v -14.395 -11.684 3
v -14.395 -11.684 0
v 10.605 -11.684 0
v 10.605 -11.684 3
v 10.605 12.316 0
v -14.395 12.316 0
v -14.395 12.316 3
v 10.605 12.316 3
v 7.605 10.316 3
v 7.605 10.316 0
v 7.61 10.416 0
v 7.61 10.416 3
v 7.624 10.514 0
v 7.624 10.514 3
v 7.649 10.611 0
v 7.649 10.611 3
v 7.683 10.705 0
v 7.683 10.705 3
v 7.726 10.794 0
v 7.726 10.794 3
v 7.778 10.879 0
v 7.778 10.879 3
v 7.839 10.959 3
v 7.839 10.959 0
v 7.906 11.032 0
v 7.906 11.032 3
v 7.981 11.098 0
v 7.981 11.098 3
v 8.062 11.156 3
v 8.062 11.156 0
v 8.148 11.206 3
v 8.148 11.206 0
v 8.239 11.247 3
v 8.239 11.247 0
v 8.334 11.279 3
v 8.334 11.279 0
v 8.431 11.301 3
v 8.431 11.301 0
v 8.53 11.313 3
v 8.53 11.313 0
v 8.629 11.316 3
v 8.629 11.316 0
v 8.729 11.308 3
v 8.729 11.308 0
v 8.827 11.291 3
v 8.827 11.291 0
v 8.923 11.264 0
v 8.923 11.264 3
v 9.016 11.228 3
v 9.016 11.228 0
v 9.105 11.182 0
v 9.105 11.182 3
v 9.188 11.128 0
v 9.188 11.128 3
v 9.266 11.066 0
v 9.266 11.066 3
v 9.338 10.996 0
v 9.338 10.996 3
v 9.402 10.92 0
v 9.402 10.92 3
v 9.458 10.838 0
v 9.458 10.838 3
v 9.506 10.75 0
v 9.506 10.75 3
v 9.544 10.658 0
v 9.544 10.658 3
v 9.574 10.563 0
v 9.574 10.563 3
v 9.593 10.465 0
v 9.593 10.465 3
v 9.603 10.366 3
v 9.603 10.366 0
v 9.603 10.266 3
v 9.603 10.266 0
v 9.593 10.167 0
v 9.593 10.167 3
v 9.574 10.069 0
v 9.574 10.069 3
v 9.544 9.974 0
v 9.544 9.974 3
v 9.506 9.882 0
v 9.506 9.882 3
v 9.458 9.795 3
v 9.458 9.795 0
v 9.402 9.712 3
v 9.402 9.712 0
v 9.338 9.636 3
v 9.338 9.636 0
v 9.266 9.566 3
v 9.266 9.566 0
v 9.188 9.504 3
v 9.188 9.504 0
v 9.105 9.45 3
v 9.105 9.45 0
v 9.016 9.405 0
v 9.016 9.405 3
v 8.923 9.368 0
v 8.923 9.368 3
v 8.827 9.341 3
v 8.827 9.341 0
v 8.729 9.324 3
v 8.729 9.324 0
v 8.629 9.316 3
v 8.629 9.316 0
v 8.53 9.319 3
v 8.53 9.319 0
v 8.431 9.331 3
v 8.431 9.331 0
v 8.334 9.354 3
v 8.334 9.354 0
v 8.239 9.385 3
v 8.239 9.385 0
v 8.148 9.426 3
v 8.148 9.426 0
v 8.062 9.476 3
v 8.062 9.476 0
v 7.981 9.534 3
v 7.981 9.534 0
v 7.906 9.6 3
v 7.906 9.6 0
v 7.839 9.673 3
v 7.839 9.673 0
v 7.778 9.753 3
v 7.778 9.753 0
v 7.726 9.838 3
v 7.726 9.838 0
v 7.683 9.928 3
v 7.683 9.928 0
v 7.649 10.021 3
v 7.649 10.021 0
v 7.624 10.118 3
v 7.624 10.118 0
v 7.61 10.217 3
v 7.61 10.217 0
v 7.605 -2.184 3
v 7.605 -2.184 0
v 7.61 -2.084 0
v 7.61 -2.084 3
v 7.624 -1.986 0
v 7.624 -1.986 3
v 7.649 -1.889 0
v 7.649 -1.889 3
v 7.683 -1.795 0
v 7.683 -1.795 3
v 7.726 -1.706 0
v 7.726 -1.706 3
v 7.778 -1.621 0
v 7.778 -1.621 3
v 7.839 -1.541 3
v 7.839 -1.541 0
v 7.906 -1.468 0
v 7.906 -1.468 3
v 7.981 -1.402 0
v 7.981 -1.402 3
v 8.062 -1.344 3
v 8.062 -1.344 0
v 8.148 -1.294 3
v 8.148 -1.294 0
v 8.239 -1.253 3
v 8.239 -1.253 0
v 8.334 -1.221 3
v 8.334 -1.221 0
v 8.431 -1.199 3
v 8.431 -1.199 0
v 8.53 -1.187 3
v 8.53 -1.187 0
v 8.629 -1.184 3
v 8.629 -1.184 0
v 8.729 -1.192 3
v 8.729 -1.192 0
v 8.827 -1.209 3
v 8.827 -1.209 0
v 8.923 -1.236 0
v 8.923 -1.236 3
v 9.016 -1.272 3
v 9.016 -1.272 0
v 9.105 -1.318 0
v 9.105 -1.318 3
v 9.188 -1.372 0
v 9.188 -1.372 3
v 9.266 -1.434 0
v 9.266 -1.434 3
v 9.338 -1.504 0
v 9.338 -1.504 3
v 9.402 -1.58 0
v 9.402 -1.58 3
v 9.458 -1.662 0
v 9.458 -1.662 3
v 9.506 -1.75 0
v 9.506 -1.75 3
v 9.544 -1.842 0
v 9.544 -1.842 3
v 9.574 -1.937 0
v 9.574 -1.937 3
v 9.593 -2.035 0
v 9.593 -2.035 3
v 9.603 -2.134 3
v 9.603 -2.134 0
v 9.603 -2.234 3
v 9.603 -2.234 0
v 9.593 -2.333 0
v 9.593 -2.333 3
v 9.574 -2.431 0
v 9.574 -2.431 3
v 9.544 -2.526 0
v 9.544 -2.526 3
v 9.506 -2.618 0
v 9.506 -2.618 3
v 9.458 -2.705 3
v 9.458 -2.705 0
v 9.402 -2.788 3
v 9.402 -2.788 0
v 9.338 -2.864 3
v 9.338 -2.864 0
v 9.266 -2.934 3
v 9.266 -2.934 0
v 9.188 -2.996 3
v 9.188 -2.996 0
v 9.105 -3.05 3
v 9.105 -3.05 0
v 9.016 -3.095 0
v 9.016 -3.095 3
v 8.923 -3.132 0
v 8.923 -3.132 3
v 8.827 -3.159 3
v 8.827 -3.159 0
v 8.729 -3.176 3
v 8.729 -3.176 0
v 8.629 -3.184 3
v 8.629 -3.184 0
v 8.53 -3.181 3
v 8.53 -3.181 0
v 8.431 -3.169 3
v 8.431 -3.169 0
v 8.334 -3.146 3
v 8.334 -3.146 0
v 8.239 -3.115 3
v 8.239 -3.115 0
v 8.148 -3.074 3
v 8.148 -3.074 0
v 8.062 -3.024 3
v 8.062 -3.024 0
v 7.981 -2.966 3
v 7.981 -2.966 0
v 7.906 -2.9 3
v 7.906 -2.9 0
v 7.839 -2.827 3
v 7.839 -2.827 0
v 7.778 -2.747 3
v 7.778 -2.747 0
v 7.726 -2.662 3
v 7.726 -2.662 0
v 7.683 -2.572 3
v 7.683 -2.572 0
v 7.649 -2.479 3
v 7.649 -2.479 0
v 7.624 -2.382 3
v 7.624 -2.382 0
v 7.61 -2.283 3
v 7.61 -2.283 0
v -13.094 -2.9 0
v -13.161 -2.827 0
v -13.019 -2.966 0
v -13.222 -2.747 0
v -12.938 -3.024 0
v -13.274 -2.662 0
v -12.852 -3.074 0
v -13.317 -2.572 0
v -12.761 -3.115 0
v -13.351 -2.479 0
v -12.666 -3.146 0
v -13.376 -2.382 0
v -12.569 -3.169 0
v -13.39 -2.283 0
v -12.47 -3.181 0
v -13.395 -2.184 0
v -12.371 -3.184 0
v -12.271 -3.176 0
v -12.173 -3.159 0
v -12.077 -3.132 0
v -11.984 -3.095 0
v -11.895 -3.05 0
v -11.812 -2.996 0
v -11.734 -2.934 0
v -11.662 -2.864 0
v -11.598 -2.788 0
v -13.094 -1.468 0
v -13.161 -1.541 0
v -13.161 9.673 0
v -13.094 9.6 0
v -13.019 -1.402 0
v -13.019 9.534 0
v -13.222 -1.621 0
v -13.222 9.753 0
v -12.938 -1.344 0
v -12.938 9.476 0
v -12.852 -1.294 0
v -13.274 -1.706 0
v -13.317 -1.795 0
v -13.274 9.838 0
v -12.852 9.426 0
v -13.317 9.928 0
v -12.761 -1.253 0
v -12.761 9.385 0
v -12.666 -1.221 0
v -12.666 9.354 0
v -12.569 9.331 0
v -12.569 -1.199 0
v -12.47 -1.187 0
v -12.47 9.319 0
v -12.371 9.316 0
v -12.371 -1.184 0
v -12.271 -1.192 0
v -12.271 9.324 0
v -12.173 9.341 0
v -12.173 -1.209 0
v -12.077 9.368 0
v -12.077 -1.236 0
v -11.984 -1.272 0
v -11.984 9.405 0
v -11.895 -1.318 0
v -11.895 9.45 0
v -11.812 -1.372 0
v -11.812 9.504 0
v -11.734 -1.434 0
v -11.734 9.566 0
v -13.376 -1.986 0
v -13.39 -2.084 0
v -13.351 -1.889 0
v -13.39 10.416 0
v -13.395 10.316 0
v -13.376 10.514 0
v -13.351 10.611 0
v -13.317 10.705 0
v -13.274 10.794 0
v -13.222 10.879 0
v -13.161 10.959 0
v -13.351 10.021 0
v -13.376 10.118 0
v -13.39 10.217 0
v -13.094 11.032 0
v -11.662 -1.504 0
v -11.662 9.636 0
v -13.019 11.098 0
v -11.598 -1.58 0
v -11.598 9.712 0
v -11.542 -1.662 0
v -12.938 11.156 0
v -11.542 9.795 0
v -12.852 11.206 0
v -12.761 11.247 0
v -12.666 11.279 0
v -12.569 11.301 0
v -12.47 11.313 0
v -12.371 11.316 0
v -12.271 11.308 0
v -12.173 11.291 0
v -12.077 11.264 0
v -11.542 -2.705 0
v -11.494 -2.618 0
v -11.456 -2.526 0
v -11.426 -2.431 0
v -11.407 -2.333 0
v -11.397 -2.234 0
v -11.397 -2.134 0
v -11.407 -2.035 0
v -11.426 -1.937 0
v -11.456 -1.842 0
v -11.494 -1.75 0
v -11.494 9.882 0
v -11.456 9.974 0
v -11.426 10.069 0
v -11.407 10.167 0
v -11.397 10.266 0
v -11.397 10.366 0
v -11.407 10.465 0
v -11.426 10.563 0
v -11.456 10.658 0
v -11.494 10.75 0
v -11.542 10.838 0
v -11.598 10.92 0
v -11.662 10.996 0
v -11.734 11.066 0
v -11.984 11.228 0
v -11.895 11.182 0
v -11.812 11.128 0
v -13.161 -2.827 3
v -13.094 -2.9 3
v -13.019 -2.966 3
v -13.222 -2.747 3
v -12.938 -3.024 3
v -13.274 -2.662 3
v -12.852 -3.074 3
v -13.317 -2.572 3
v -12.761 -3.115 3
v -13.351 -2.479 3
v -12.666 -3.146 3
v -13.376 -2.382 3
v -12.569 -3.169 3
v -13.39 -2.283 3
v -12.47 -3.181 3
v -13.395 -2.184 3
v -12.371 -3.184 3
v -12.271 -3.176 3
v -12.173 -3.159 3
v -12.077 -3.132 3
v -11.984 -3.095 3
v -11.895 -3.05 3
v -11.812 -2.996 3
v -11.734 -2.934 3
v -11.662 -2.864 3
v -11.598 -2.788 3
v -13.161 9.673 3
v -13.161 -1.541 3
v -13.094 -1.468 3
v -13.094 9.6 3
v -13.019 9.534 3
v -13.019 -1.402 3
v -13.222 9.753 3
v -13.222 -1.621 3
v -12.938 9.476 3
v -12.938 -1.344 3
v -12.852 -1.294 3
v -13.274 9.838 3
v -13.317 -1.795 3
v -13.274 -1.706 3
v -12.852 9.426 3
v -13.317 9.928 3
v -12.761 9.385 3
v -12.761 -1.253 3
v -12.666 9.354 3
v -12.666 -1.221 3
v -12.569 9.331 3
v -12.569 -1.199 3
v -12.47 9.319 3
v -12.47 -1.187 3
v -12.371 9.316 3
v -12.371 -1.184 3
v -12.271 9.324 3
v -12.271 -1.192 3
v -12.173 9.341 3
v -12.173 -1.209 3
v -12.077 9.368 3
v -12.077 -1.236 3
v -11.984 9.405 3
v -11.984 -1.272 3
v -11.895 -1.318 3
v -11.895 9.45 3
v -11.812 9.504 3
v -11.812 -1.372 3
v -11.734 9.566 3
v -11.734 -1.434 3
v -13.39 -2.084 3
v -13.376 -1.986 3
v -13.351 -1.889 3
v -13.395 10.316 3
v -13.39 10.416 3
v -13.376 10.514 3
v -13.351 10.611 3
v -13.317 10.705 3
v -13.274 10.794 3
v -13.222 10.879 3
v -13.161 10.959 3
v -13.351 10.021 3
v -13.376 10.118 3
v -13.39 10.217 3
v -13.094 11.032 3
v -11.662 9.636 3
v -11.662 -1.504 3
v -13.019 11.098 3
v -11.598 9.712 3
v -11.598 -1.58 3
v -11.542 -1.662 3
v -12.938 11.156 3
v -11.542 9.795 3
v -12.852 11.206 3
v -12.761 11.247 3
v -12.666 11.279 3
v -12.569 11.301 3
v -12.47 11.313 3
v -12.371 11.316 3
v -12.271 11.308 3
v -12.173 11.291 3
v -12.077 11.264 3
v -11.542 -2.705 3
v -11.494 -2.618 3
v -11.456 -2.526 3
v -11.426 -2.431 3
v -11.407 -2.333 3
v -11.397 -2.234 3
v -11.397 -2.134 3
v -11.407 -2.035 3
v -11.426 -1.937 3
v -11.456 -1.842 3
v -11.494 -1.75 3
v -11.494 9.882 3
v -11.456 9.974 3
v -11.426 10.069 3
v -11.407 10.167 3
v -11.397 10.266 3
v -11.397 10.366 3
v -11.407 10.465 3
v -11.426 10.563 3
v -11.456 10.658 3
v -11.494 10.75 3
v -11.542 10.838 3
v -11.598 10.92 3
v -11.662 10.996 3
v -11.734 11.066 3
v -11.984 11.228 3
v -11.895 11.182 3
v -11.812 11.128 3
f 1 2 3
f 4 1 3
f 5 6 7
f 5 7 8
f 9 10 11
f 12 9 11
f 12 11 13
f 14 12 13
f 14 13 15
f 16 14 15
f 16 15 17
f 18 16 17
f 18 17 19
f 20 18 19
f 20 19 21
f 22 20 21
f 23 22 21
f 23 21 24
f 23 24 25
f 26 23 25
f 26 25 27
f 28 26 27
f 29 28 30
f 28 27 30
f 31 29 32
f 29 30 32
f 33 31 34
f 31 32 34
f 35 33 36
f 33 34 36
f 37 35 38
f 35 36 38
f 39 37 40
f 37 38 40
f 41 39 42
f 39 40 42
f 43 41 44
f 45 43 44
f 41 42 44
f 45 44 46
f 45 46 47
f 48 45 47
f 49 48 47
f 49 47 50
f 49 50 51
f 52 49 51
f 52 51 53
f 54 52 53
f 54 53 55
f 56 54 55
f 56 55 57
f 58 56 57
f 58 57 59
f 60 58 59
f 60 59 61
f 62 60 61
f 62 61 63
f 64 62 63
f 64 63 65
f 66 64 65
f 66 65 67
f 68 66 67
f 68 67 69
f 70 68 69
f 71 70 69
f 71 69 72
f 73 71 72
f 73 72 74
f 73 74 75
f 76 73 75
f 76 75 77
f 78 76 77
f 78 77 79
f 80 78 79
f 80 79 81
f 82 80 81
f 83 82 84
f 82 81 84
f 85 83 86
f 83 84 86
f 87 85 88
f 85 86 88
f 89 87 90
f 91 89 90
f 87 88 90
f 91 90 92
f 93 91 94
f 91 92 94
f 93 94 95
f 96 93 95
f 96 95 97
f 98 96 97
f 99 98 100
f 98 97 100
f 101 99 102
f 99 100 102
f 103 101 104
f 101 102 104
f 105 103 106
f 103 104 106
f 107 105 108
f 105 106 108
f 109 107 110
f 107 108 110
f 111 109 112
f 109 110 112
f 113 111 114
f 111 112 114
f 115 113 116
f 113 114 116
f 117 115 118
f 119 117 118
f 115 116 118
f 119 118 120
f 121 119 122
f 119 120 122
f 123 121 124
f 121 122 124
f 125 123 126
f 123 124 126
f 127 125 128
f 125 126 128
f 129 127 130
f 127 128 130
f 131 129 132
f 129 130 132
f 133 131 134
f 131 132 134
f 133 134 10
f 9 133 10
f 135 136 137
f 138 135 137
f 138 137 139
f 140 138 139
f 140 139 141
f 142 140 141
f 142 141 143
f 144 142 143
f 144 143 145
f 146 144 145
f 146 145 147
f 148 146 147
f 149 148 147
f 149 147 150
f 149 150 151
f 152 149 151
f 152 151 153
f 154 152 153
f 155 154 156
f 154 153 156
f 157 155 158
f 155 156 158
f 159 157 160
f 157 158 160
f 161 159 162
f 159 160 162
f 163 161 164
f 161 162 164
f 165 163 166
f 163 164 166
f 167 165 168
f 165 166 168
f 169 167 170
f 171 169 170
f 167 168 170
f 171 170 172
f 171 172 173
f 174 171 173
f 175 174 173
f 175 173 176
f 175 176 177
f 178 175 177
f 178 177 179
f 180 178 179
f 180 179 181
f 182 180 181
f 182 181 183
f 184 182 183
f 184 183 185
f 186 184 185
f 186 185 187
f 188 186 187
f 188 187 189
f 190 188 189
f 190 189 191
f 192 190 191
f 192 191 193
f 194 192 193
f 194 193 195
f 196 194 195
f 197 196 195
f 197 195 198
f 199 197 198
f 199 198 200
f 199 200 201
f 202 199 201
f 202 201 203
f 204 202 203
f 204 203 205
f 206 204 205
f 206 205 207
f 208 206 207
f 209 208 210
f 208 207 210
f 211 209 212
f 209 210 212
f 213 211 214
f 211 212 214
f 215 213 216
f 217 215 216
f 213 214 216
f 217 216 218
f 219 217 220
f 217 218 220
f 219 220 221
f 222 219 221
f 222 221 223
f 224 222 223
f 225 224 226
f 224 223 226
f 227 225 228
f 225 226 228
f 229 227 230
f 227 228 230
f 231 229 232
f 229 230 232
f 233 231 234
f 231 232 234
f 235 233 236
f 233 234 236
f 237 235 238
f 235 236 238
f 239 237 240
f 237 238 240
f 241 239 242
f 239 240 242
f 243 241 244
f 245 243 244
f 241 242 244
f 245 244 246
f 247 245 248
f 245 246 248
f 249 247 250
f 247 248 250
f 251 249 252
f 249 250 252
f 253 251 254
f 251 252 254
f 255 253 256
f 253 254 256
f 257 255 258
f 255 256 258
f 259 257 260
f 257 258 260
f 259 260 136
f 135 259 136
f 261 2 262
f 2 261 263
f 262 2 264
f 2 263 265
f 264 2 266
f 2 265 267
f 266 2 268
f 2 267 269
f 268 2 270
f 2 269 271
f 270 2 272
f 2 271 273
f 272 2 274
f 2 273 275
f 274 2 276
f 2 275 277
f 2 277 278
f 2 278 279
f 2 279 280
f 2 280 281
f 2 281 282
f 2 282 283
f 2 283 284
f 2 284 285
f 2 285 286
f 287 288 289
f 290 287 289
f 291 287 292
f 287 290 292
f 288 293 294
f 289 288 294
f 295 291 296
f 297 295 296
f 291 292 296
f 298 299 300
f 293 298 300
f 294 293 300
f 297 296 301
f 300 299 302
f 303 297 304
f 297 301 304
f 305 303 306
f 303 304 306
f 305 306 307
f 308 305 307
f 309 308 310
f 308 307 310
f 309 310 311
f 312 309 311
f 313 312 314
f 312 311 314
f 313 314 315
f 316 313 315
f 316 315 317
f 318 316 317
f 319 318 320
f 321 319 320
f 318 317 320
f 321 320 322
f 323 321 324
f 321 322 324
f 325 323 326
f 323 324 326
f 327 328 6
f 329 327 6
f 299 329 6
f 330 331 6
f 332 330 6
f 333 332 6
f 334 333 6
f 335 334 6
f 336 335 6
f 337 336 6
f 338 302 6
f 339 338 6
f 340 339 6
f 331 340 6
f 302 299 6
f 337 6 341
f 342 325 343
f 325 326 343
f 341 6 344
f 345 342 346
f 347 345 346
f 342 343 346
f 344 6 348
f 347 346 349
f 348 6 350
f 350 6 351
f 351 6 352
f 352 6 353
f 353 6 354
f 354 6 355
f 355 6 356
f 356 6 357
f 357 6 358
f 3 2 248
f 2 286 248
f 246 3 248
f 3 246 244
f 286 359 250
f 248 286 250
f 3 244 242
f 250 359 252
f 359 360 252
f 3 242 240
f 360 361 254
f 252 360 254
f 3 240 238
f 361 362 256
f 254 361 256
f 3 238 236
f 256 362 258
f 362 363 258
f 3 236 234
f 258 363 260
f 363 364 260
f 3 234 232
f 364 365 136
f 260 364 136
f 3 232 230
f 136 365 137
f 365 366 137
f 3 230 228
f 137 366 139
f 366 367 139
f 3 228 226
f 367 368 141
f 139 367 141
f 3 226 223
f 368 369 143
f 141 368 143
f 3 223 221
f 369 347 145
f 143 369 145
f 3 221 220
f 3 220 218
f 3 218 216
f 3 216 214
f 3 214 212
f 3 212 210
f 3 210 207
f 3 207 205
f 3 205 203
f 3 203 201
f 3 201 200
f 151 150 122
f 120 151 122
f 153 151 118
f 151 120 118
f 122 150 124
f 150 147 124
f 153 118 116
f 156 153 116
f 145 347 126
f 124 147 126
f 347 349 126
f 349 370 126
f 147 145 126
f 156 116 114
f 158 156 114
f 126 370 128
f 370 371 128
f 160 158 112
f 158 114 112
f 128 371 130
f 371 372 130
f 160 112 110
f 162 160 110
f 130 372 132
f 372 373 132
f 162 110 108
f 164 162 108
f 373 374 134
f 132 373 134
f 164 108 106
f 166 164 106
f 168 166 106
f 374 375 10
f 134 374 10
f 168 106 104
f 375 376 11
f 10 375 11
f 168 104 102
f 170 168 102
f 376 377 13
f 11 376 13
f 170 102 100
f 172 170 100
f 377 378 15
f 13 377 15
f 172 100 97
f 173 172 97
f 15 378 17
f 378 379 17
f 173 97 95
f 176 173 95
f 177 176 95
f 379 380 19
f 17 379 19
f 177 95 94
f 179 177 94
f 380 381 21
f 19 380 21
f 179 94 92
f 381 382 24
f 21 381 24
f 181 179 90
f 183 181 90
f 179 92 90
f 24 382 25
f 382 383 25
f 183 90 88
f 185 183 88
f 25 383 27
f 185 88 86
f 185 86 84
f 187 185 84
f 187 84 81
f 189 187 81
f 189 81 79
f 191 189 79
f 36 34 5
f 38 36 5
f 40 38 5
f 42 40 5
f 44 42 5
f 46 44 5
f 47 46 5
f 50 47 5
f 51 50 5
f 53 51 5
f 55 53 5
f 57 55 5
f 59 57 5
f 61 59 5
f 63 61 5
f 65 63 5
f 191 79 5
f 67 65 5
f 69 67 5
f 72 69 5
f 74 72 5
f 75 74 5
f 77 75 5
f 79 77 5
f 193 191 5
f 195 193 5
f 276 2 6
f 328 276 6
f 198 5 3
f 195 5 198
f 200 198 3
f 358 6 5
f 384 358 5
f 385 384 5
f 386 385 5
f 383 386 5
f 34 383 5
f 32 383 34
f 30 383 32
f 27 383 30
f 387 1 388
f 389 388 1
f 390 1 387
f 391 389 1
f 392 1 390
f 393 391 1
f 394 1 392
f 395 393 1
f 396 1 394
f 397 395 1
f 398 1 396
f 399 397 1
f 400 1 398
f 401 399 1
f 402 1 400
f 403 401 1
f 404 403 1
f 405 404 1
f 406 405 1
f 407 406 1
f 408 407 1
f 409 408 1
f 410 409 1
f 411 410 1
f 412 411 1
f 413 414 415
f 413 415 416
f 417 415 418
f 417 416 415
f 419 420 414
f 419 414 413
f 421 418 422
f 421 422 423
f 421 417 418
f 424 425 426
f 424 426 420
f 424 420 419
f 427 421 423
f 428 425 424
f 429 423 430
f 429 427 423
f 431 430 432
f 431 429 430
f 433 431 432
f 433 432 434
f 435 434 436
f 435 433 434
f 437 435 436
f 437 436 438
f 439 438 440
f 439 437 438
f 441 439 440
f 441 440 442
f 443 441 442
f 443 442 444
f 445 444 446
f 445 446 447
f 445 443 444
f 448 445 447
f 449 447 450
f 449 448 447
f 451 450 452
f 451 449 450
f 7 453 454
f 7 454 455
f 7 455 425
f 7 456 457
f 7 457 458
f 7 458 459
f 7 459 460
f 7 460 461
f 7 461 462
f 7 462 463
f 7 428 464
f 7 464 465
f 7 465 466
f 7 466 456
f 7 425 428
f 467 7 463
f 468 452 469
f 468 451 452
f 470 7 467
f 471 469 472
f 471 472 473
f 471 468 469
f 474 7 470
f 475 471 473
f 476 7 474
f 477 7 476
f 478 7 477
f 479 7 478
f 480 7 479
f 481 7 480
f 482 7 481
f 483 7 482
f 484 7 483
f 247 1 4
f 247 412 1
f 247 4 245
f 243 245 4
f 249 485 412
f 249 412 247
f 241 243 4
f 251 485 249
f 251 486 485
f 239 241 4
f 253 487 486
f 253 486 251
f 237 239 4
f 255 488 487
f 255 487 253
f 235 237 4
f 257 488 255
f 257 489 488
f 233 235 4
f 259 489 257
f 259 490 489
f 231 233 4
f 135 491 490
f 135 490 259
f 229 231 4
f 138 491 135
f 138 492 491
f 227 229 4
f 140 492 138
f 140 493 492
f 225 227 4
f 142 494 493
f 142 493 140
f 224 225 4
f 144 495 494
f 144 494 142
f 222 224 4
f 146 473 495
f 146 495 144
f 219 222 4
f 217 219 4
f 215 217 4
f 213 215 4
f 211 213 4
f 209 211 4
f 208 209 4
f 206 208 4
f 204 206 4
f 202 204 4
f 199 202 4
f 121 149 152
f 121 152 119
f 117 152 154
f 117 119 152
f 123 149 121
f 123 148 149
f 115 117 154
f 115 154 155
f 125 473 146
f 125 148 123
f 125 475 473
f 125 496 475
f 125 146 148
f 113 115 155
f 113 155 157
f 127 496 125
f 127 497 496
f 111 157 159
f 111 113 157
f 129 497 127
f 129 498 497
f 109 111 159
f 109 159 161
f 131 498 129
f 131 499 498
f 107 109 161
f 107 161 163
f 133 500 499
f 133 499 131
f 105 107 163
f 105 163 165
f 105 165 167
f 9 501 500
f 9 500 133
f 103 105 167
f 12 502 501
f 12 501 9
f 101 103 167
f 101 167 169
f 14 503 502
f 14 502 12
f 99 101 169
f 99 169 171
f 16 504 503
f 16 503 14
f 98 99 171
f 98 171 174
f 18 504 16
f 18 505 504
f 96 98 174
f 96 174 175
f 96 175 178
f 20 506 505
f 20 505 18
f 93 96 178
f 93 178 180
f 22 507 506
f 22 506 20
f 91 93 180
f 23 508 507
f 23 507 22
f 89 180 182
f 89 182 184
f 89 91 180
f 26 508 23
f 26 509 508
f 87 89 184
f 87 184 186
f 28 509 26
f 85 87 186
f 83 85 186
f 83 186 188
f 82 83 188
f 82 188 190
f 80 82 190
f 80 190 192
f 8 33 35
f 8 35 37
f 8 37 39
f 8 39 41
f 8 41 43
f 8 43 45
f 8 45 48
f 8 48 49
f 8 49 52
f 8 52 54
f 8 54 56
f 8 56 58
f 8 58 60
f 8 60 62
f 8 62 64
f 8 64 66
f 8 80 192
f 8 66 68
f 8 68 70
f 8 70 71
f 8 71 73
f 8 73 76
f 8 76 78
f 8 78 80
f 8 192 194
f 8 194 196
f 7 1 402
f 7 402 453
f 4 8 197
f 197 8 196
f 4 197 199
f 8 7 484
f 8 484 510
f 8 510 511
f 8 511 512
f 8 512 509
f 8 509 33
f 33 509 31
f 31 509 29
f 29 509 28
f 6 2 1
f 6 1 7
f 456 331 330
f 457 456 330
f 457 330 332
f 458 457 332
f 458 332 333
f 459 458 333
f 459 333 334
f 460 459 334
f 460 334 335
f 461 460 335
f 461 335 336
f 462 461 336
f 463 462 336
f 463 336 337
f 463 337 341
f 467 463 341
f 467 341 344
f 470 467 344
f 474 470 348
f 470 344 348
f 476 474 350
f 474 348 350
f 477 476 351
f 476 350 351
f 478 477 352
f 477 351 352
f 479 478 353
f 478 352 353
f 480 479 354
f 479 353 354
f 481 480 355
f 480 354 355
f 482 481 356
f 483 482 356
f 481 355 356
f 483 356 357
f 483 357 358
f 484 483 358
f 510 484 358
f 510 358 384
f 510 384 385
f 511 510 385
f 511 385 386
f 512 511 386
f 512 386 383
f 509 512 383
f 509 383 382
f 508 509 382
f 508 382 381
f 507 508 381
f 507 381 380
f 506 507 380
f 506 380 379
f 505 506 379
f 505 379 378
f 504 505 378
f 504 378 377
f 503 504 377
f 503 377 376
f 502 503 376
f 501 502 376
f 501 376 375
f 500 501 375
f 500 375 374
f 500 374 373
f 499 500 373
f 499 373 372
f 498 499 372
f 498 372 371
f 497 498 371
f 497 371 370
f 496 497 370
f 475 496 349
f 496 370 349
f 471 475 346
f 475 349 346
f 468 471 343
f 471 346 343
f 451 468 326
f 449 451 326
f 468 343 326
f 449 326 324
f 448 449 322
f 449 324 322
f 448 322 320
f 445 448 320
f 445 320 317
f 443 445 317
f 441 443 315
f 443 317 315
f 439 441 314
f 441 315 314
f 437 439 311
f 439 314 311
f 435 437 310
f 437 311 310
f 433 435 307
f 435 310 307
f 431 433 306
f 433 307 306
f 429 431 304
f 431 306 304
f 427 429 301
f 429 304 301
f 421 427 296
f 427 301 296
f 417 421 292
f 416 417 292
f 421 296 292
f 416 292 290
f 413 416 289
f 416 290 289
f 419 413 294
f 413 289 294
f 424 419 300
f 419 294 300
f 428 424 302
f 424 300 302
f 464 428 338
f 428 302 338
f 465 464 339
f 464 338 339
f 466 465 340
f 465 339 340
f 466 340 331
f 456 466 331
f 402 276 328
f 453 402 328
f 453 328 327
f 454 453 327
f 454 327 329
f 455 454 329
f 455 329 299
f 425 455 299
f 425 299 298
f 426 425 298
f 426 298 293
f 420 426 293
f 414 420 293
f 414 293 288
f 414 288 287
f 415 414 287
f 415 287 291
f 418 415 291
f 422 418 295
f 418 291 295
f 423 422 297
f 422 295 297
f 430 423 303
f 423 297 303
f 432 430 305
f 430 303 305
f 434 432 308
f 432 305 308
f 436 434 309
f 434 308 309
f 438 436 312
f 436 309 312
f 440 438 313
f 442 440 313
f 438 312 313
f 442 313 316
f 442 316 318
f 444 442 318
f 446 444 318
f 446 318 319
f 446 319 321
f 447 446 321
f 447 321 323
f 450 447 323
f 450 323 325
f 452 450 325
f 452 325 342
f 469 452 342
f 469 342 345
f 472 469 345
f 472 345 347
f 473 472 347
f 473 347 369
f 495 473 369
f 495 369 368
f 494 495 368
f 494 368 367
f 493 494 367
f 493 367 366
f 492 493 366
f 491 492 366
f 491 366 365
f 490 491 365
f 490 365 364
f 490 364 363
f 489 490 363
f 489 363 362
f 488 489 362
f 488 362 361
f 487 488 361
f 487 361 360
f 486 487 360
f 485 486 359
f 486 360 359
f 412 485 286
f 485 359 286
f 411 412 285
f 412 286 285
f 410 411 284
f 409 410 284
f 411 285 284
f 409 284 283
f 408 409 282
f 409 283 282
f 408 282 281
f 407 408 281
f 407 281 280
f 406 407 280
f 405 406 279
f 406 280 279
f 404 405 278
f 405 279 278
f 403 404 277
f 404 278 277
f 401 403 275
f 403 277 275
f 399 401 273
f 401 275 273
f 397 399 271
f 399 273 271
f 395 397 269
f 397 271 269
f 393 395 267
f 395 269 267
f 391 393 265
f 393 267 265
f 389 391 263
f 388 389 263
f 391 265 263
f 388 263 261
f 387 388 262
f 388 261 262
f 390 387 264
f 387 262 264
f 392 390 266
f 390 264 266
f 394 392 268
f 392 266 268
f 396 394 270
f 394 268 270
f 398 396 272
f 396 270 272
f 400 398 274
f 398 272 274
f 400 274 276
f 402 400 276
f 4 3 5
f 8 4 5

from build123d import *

# Parameters (mm, degrees)
SKETCH_1_W                = 25
SKETCH_1_H                = 24
EXTRUDE_1_DEPTH           = 3
HOLE_WIZARD_2_0_2_1_D     = 2
HOLE_WIZARD_2_0_2_1_DEPTH = 5.5
HOLE_WIZARD_2_0_2_1_TIP   = 0.600860619


with BuildPart() as part:
    # 草图1 → 凸台-拉伸1 (new body)
    with BuildSketch(Plane.XY):
        with Locations((-1.895437834, 0.316156105)):
            Rectangle(SKETCH_1_W, SKETCH_1_H)
    extrude(amount=EXTRUDE_1_DEPTH)

    # Ø2.0 (2) 直径孔1
    with Locations(Plane.XY.offset(3)):
        with Locations((-12.395437834, 10.316156105), (8.604562166, 10.316156105), (-12.395437834, -2.183843895), (8.604562166, -2.183843895)):
            Hole(HOLE_WIZARD_2_0_2_1_D / 2, depth=HOLE_WIZARD_2_0_2_1_DEPTH)
            with Locations((0, 0, -(HOLE_WIZARD_2_0_2_1_DEPTH + HOLE_WIZARD_2_0_2_1_TIP / 2))):  # 118° drill point
                Cone(0, HOLE_WIZARD_2_0_2_1_D / 2, HOLE_WIZARD_2_0_2_1_TIP, mode=Mode.SUBTRACT)


solid = part.part
